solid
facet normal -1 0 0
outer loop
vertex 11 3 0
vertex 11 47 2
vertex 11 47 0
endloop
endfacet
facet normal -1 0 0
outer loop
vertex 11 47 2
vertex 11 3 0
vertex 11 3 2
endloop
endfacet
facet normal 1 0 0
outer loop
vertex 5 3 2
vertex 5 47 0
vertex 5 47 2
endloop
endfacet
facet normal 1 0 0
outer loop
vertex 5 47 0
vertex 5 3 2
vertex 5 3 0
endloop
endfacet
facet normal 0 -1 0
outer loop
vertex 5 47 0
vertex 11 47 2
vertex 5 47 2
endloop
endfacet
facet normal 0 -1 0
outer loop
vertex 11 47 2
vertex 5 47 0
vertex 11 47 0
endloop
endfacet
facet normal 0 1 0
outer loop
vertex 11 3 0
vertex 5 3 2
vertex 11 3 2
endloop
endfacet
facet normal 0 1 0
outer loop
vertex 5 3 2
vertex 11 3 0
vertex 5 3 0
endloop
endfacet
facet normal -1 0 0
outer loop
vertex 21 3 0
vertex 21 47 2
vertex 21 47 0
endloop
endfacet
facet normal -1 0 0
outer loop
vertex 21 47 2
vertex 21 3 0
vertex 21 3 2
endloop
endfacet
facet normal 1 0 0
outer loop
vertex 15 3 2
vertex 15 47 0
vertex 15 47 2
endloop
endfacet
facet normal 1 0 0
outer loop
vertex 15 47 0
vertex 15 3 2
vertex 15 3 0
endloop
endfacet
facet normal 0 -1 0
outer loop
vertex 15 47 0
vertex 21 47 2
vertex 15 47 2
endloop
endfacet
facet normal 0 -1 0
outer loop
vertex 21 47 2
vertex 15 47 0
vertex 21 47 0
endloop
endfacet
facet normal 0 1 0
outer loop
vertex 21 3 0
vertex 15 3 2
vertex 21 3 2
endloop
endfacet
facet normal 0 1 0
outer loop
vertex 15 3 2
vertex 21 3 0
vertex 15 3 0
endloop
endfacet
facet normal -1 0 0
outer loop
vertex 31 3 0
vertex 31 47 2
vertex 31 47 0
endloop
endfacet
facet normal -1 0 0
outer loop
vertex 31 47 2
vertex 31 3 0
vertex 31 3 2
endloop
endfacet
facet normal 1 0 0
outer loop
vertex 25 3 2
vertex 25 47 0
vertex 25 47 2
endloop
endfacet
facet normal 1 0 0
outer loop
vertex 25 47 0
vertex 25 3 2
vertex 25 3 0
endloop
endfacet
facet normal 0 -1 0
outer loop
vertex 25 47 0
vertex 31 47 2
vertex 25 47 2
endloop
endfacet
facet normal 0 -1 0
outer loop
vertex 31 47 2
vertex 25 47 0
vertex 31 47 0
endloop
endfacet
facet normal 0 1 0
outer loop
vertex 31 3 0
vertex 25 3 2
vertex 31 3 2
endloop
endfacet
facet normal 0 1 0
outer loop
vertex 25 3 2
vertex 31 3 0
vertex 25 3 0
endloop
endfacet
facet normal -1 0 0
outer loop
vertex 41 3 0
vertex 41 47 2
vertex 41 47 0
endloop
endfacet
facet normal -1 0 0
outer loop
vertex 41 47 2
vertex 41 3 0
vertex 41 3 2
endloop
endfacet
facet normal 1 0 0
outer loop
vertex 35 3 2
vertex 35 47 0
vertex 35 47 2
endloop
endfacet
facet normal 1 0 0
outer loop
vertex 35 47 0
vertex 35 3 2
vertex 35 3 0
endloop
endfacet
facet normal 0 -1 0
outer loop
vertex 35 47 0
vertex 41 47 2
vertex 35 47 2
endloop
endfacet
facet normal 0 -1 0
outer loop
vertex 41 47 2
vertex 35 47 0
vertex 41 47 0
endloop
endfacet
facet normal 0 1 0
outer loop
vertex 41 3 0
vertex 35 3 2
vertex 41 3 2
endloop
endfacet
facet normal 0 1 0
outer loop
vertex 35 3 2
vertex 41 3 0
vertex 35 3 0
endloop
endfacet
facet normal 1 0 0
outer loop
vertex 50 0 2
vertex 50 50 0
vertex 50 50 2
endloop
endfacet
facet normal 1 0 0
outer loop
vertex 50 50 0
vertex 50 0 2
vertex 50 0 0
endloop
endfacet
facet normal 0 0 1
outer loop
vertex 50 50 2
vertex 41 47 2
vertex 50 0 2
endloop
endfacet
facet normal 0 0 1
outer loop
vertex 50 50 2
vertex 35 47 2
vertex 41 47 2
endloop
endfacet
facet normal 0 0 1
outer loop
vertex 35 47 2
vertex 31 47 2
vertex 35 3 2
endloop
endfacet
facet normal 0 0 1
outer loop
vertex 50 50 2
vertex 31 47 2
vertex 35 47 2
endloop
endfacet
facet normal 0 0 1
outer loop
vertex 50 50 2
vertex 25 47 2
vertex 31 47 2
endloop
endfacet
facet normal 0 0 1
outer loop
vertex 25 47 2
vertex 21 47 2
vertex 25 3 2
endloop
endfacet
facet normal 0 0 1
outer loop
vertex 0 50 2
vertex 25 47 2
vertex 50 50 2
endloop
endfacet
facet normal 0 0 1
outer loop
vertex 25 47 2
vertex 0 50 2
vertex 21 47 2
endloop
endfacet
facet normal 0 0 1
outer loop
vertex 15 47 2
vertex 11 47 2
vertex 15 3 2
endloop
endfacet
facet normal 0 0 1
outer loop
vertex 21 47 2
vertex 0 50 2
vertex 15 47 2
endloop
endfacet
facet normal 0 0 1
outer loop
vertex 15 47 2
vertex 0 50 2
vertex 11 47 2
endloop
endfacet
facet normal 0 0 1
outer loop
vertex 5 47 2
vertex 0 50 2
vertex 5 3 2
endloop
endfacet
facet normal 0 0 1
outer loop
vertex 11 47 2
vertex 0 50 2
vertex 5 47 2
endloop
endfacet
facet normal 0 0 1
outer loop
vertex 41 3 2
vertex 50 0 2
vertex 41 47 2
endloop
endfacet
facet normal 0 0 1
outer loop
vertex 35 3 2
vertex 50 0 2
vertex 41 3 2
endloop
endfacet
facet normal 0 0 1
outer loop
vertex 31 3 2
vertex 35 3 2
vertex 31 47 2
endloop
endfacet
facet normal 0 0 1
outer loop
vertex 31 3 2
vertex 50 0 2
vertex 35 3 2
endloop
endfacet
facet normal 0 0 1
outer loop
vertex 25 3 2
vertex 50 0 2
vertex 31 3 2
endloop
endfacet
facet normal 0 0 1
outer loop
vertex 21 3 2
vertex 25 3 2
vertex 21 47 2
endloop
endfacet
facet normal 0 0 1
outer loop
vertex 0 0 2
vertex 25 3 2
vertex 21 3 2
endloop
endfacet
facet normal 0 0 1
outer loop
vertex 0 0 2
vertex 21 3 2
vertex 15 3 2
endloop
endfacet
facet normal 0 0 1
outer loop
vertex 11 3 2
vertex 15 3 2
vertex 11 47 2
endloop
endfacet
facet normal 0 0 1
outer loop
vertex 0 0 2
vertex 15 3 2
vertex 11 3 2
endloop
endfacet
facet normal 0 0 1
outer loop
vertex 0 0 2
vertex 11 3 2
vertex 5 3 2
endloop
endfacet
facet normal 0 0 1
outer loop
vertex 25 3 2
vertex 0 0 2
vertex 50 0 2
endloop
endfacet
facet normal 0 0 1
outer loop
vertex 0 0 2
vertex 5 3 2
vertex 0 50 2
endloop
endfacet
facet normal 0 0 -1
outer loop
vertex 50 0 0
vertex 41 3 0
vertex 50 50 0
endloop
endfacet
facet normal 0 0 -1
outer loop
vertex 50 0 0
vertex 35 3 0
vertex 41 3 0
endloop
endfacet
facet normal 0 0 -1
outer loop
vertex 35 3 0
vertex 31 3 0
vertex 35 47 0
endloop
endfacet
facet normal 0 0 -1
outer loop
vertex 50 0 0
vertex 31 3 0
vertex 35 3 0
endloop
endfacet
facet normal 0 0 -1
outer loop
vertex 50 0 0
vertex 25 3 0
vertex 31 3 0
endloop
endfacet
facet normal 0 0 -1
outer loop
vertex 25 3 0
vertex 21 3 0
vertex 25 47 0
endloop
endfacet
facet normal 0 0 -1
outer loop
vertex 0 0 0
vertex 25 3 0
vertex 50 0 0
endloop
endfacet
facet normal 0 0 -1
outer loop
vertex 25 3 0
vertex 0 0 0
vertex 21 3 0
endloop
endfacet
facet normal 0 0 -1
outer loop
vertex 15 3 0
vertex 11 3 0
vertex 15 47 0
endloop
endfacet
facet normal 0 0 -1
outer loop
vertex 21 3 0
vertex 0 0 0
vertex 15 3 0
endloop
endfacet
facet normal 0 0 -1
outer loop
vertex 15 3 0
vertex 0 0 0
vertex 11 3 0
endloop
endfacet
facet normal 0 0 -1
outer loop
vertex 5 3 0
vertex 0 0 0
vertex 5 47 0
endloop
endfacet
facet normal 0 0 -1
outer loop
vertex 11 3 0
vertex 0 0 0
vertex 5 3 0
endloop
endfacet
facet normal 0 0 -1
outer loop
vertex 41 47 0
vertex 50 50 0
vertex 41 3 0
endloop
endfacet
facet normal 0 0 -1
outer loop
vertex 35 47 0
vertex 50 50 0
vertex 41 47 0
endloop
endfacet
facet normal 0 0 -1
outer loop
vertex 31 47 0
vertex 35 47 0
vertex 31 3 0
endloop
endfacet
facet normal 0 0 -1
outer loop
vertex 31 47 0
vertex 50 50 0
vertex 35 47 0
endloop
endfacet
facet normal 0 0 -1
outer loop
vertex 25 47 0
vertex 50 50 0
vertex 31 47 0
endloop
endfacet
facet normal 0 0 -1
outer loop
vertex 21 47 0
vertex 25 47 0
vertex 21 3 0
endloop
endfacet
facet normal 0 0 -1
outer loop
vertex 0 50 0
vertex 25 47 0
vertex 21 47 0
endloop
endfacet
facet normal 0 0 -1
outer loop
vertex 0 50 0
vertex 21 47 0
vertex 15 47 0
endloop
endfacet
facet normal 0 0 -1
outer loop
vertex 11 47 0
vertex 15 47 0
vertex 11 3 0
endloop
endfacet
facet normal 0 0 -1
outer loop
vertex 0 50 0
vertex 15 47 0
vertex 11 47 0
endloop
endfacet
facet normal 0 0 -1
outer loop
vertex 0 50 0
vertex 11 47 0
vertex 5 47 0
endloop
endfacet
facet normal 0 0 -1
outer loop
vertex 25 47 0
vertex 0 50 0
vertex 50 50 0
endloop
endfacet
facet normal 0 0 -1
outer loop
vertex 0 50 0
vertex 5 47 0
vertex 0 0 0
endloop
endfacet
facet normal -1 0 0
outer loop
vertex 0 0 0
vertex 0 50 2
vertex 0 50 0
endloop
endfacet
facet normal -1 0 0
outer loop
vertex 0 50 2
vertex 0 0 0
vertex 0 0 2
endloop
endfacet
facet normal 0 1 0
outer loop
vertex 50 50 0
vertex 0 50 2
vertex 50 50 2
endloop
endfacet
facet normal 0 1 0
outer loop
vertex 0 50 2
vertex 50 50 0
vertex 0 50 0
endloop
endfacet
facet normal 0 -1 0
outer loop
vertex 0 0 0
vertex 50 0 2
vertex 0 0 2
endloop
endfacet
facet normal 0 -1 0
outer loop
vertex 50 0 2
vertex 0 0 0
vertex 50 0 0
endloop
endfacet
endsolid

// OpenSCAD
w = 50;
d = 50;
h = 2;
wh = 6;
wh_gap = 4;

count = w / (wh + wh_gap) - 2;
difference() {
    cube( [w,d,h] );
    for (i = [0: count]) {
        translate([5 + i * (wh + wh_gap), 3, -1])
        color("red")
        cube([wh, d -6, h +2]);
    }
}
